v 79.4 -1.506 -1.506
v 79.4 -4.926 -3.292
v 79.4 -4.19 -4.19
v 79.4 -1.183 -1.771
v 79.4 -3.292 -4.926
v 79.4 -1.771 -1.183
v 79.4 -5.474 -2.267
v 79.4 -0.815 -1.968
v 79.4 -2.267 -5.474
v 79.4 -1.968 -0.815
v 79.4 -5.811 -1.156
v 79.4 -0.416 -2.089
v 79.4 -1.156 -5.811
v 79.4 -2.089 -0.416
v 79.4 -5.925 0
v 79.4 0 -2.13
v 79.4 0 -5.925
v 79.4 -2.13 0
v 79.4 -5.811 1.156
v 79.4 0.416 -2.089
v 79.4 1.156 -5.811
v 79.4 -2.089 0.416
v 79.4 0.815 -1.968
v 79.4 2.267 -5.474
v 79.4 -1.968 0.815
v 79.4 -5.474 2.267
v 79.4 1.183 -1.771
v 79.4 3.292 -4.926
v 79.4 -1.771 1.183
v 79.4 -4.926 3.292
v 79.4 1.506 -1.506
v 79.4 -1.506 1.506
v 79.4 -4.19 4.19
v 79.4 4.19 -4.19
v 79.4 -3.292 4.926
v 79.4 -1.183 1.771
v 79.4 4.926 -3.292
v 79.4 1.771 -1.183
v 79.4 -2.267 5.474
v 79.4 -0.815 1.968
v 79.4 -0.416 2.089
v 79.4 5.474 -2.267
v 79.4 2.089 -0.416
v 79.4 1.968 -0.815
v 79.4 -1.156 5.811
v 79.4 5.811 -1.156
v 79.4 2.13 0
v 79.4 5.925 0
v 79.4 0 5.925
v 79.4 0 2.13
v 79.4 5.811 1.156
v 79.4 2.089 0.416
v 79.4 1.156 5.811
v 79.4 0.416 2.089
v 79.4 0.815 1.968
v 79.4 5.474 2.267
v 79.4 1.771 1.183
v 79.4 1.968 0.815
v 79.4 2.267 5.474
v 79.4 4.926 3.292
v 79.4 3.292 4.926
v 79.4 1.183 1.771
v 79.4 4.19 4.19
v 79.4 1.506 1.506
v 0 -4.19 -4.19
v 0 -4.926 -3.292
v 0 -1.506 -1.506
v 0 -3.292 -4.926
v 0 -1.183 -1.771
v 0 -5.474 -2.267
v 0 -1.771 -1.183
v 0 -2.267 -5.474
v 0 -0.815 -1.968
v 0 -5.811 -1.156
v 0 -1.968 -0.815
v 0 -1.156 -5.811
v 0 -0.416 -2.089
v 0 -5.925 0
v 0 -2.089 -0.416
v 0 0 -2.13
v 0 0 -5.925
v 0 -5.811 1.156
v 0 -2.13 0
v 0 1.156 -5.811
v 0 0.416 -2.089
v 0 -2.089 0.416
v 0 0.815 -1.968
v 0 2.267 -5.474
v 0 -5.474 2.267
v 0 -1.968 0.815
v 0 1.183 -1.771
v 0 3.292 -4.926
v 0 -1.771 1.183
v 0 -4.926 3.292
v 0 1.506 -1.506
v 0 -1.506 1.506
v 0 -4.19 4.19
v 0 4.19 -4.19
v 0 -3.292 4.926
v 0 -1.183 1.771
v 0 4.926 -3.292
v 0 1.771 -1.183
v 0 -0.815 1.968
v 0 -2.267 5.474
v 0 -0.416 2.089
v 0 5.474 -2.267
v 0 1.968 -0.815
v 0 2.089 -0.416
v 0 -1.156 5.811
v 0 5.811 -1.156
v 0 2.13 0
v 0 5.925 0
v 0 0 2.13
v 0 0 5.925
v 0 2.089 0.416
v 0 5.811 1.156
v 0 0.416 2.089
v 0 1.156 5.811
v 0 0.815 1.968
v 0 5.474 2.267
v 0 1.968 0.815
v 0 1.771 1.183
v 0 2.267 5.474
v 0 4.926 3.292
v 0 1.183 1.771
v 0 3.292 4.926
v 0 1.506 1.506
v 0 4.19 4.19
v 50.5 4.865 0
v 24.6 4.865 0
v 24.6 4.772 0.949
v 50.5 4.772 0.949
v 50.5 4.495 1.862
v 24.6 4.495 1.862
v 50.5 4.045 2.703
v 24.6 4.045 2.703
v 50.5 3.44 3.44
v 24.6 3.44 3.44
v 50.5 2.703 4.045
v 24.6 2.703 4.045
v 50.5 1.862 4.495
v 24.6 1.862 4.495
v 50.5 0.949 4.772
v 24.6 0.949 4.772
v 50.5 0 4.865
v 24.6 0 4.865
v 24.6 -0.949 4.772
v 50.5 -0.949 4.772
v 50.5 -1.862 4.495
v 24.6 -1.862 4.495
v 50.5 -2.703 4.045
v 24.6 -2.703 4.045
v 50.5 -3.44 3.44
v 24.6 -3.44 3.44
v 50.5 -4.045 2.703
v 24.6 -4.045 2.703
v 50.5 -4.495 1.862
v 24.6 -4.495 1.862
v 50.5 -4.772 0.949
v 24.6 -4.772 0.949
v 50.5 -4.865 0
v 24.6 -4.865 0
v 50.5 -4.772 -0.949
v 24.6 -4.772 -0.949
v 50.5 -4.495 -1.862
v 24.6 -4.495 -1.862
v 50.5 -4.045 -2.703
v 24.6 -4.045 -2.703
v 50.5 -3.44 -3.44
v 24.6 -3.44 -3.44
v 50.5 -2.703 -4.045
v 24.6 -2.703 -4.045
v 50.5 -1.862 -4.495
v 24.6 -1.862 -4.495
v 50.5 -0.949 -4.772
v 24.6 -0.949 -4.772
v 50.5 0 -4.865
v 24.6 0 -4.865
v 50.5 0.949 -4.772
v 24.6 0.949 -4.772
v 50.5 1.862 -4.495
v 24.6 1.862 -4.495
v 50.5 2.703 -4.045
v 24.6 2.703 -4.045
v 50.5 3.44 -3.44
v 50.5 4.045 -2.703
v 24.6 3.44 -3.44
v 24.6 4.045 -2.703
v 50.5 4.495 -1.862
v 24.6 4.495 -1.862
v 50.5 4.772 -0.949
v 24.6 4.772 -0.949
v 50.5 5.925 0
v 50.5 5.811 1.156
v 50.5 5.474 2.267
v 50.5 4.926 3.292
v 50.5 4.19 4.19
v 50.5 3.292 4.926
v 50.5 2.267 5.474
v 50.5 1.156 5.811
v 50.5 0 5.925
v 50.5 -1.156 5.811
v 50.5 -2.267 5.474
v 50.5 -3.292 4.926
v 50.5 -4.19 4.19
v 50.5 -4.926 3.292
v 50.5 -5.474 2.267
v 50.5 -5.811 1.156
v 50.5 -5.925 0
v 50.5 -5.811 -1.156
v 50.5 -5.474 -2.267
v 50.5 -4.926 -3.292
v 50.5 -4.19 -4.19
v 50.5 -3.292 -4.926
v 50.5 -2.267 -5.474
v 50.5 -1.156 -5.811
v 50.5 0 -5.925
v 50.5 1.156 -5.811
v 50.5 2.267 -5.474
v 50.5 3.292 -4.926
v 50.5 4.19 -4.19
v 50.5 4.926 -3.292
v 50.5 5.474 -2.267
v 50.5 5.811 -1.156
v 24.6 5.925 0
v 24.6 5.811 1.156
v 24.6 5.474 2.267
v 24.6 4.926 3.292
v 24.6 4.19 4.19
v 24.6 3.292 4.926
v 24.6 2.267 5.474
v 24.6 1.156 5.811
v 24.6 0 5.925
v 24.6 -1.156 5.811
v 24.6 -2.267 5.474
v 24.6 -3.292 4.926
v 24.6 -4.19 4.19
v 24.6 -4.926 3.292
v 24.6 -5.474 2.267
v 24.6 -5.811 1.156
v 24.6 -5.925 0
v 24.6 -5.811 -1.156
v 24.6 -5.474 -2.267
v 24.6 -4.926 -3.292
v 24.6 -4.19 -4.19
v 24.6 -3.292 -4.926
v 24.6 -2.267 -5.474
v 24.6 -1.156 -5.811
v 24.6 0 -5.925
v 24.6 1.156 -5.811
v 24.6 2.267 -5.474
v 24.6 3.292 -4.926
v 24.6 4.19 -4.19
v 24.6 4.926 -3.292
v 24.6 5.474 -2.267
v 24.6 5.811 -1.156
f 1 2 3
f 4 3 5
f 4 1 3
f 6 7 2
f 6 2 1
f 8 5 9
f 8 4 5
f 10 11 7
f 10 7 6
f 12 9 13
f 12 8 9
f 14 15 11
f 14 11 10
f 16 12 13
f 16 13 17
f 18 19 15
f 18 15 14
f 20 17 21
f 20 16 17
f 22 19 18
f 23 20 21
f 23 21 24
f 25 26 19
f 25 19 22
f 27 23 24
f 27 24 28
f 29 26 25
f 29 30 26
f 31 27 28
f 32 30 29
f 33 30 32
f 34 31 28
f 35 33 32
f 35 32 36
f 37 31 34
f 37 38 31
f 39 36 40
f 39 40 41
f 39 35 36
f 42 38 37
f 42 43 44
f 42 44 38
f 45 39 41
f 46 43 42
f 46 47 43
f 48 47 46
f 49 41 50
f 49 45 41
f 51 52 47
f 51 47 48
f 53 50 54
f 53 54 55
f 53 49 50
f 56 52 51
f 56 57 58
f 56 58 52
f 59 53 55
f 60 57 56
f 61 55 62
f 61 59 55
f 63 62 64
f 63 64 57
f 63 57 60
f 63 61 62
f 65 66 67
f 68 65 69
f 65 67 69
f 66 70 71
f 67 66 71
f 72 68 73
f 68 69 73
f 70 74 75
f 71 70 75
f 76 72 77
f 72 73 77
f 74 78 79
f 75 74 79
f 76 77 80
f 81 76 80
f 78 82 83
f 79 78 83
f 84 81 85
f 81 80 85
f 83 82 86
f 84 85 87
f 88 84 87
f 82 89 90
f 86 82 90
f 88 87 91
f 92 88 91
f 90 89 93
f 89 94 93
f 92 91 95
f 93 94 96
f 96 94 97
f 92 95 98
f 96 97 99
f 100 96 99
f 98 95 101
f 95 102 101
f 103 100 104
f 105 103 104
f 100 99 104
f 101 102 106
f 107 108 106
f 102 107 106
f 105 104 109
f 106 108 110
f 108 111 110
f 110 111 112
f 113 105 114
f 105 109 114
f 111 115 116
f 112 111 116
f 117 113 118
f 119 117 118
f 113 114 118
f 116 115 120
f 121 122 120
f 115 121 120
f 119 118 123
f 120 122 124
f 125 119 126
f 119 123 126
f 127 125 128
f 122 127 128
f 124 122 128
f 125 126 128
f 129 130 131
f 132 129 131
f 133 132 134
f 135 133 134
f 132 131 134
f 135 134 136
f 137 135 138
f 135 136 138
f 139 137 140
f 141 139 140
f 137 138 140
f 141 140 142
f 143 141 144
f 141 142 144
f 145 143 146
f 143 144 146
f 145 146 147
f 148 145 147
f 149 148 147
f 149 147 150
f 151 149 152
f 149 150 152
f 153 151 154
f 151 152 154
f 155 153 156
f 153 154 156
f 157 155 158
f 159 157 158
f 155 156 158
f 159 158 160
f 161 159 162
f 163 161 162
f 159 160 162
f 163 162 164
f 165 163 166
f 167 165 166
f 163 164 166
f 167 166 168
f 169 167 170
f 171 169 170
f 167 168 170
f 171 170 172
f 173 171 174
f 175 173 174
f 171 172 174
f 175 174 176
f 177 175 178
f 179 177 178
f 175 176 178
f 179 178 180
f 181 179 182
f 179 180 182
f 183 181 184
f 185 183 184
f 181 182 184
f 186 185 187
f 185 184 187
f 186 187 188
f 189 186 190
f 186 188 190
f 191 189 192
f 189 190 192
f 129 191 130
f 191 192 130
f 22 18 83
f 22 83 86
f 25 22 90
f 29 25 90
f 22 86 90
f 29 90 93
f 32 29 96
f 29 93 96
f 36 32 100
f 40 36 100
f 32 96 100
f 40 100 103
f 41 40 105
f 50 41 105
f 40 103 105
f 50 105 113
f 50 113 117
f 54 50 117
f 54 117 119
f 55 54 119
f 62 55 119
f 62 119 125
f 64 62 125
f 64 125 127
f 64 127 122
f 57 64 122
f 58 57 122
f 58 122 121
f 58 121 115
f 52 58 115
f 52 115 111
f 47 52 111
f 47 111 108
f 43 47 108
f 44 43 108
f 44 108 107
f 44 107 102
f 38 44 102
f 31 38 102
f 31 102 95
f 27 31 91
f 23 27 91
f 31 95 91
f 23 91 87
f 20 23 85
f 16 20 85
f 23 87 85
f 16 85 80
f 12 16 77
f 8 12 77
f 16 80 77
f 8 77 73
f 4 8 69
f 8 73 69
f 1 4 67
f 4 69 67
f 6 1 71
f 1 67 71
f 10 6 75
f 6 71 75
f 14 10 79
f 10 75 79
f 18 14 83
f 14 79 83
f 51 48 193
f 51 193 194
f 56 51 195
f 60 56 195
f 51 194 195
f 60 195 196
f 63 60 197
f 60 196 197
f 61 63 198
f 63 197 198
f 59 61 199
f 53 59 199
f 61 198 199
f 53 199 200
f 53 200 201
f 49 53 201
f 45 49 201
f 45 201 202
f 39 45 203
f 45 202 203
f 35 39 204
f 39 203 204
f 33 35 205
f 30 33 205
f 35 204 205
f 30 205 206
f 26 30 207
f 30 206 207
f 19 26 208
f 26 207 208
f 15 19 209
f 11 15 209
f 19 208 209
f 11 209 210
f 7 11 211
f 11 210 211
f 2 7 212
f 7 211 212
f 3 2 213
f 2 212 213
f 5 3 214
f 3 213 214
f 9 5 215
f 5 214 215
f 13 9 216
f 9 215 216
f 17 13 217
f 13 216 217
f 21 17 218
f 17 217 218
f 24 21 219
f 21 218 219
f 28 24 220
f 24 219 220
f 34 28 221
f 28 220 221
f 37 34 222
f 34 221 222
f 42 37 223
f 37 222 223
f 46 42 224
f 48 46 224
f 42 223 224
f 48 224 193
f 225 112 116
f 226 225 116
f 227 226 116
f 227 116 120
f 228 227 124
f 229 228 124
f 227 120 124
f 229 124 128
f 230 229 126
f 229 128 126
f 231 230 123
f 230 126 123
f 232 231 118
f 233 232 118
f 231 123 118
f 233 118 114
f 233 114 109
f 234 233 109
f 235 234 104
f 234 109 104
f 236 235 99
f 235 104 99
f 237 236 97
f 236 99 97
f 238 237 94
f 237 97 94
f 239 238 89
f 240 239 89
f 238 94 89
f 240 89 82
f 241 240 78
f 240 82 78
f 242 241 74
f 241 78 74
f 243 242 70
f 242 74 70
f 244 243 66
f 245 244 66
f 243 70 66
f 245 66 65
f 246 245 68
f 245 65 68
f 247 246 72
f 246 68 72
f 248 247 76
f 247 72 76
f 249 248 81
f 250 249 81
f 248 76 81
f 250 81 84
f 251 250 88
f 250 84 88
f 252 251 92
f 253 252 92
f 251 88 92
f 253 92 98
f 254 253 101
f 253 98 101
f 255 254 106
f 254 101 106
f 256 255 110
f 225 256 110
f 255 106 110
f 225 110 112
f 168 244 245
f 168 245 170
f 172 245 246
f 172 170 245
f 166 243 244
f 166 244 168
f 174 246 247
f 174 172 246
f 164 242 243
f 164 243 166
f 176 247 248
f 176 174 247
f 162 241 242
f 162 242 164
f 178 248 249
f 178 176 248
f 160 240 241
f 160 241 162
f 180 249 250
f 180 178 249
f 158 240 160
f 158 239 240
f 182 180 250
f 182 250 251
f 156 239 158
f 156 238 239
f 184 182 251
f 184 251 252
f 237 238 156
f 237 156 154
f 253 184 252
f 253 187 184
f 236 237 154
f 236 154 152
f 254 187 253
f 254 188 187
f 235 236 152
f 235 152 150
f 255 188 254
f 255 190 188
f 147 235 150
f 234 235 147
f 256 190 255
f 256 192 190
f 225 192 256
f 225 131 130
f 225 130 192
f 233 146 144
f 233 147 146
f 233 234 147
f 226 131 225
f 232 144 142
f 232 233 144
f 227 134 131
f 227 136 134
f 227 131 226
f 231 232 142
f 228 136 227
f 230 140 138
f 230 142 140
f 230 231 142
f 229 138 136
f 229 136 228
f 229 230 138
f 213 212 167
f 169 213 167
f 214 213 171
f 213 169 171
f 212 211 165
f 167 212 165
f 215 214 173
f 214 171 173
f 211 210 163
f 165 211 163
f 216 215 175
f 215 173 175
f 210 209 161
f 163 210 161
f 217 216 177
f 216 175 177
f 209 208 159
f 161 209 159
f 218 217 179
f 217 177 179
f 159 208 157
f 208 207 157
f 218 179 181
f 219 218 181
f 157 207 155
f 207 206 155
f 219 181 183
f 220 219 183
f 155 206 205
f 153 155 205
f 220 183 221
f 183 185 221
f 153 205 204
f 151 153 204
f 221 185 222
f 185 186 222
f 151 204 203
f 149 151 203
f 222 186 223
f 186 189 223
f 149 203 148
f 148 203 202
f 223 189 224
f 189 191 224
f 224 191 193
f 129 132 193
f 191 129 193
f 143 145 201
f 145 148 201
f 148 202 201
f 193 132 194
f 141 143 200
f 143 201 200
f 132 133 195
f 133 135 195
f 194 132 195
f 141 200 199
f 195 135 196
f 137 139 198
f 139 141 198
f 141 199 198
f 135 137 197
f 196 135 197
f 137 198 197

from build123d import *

# Parameters (mm, degrees)
F0_R     = 5.925
F1_DEPTH = 24.6
F2_R     = 4.865
F3_DEPTH = 25.9
F4_R     = 5.925
F4_R_2   = 4.865
F5_DEPTH = 28.9
F7_D     = 4.26


with BuildPart() as f1:
    # F0 (on Right) → F1 (new body)
    with BuildSketch(Plane.YZ):
        Circle(F0_R)
    extrude(amount=F1_DEPTH)

    # F2 (on face) → F3 (join)
    with BuildSketch(Plane.YZ.offset(24.6)):
        Circle(F2_R)
    extrude(amount=F3_DEPTH)

    # F4 (on face) → F5 (join)
    with BuildSketch(Plane.YZ.offset(50.5)):
        Circle(F4_R)
        Circle(F4_R_2, mode=Mode.SUBTRACT)
        Circle(F4_R_2)
    extrude(amount=F5_DEPTH)

    # F7 (through all)
    with Locations(Plane.YZ.offset(79.4)):
        with Locations((0, 0)):
            Hole(F7_D / 2)


solid = f1.part
